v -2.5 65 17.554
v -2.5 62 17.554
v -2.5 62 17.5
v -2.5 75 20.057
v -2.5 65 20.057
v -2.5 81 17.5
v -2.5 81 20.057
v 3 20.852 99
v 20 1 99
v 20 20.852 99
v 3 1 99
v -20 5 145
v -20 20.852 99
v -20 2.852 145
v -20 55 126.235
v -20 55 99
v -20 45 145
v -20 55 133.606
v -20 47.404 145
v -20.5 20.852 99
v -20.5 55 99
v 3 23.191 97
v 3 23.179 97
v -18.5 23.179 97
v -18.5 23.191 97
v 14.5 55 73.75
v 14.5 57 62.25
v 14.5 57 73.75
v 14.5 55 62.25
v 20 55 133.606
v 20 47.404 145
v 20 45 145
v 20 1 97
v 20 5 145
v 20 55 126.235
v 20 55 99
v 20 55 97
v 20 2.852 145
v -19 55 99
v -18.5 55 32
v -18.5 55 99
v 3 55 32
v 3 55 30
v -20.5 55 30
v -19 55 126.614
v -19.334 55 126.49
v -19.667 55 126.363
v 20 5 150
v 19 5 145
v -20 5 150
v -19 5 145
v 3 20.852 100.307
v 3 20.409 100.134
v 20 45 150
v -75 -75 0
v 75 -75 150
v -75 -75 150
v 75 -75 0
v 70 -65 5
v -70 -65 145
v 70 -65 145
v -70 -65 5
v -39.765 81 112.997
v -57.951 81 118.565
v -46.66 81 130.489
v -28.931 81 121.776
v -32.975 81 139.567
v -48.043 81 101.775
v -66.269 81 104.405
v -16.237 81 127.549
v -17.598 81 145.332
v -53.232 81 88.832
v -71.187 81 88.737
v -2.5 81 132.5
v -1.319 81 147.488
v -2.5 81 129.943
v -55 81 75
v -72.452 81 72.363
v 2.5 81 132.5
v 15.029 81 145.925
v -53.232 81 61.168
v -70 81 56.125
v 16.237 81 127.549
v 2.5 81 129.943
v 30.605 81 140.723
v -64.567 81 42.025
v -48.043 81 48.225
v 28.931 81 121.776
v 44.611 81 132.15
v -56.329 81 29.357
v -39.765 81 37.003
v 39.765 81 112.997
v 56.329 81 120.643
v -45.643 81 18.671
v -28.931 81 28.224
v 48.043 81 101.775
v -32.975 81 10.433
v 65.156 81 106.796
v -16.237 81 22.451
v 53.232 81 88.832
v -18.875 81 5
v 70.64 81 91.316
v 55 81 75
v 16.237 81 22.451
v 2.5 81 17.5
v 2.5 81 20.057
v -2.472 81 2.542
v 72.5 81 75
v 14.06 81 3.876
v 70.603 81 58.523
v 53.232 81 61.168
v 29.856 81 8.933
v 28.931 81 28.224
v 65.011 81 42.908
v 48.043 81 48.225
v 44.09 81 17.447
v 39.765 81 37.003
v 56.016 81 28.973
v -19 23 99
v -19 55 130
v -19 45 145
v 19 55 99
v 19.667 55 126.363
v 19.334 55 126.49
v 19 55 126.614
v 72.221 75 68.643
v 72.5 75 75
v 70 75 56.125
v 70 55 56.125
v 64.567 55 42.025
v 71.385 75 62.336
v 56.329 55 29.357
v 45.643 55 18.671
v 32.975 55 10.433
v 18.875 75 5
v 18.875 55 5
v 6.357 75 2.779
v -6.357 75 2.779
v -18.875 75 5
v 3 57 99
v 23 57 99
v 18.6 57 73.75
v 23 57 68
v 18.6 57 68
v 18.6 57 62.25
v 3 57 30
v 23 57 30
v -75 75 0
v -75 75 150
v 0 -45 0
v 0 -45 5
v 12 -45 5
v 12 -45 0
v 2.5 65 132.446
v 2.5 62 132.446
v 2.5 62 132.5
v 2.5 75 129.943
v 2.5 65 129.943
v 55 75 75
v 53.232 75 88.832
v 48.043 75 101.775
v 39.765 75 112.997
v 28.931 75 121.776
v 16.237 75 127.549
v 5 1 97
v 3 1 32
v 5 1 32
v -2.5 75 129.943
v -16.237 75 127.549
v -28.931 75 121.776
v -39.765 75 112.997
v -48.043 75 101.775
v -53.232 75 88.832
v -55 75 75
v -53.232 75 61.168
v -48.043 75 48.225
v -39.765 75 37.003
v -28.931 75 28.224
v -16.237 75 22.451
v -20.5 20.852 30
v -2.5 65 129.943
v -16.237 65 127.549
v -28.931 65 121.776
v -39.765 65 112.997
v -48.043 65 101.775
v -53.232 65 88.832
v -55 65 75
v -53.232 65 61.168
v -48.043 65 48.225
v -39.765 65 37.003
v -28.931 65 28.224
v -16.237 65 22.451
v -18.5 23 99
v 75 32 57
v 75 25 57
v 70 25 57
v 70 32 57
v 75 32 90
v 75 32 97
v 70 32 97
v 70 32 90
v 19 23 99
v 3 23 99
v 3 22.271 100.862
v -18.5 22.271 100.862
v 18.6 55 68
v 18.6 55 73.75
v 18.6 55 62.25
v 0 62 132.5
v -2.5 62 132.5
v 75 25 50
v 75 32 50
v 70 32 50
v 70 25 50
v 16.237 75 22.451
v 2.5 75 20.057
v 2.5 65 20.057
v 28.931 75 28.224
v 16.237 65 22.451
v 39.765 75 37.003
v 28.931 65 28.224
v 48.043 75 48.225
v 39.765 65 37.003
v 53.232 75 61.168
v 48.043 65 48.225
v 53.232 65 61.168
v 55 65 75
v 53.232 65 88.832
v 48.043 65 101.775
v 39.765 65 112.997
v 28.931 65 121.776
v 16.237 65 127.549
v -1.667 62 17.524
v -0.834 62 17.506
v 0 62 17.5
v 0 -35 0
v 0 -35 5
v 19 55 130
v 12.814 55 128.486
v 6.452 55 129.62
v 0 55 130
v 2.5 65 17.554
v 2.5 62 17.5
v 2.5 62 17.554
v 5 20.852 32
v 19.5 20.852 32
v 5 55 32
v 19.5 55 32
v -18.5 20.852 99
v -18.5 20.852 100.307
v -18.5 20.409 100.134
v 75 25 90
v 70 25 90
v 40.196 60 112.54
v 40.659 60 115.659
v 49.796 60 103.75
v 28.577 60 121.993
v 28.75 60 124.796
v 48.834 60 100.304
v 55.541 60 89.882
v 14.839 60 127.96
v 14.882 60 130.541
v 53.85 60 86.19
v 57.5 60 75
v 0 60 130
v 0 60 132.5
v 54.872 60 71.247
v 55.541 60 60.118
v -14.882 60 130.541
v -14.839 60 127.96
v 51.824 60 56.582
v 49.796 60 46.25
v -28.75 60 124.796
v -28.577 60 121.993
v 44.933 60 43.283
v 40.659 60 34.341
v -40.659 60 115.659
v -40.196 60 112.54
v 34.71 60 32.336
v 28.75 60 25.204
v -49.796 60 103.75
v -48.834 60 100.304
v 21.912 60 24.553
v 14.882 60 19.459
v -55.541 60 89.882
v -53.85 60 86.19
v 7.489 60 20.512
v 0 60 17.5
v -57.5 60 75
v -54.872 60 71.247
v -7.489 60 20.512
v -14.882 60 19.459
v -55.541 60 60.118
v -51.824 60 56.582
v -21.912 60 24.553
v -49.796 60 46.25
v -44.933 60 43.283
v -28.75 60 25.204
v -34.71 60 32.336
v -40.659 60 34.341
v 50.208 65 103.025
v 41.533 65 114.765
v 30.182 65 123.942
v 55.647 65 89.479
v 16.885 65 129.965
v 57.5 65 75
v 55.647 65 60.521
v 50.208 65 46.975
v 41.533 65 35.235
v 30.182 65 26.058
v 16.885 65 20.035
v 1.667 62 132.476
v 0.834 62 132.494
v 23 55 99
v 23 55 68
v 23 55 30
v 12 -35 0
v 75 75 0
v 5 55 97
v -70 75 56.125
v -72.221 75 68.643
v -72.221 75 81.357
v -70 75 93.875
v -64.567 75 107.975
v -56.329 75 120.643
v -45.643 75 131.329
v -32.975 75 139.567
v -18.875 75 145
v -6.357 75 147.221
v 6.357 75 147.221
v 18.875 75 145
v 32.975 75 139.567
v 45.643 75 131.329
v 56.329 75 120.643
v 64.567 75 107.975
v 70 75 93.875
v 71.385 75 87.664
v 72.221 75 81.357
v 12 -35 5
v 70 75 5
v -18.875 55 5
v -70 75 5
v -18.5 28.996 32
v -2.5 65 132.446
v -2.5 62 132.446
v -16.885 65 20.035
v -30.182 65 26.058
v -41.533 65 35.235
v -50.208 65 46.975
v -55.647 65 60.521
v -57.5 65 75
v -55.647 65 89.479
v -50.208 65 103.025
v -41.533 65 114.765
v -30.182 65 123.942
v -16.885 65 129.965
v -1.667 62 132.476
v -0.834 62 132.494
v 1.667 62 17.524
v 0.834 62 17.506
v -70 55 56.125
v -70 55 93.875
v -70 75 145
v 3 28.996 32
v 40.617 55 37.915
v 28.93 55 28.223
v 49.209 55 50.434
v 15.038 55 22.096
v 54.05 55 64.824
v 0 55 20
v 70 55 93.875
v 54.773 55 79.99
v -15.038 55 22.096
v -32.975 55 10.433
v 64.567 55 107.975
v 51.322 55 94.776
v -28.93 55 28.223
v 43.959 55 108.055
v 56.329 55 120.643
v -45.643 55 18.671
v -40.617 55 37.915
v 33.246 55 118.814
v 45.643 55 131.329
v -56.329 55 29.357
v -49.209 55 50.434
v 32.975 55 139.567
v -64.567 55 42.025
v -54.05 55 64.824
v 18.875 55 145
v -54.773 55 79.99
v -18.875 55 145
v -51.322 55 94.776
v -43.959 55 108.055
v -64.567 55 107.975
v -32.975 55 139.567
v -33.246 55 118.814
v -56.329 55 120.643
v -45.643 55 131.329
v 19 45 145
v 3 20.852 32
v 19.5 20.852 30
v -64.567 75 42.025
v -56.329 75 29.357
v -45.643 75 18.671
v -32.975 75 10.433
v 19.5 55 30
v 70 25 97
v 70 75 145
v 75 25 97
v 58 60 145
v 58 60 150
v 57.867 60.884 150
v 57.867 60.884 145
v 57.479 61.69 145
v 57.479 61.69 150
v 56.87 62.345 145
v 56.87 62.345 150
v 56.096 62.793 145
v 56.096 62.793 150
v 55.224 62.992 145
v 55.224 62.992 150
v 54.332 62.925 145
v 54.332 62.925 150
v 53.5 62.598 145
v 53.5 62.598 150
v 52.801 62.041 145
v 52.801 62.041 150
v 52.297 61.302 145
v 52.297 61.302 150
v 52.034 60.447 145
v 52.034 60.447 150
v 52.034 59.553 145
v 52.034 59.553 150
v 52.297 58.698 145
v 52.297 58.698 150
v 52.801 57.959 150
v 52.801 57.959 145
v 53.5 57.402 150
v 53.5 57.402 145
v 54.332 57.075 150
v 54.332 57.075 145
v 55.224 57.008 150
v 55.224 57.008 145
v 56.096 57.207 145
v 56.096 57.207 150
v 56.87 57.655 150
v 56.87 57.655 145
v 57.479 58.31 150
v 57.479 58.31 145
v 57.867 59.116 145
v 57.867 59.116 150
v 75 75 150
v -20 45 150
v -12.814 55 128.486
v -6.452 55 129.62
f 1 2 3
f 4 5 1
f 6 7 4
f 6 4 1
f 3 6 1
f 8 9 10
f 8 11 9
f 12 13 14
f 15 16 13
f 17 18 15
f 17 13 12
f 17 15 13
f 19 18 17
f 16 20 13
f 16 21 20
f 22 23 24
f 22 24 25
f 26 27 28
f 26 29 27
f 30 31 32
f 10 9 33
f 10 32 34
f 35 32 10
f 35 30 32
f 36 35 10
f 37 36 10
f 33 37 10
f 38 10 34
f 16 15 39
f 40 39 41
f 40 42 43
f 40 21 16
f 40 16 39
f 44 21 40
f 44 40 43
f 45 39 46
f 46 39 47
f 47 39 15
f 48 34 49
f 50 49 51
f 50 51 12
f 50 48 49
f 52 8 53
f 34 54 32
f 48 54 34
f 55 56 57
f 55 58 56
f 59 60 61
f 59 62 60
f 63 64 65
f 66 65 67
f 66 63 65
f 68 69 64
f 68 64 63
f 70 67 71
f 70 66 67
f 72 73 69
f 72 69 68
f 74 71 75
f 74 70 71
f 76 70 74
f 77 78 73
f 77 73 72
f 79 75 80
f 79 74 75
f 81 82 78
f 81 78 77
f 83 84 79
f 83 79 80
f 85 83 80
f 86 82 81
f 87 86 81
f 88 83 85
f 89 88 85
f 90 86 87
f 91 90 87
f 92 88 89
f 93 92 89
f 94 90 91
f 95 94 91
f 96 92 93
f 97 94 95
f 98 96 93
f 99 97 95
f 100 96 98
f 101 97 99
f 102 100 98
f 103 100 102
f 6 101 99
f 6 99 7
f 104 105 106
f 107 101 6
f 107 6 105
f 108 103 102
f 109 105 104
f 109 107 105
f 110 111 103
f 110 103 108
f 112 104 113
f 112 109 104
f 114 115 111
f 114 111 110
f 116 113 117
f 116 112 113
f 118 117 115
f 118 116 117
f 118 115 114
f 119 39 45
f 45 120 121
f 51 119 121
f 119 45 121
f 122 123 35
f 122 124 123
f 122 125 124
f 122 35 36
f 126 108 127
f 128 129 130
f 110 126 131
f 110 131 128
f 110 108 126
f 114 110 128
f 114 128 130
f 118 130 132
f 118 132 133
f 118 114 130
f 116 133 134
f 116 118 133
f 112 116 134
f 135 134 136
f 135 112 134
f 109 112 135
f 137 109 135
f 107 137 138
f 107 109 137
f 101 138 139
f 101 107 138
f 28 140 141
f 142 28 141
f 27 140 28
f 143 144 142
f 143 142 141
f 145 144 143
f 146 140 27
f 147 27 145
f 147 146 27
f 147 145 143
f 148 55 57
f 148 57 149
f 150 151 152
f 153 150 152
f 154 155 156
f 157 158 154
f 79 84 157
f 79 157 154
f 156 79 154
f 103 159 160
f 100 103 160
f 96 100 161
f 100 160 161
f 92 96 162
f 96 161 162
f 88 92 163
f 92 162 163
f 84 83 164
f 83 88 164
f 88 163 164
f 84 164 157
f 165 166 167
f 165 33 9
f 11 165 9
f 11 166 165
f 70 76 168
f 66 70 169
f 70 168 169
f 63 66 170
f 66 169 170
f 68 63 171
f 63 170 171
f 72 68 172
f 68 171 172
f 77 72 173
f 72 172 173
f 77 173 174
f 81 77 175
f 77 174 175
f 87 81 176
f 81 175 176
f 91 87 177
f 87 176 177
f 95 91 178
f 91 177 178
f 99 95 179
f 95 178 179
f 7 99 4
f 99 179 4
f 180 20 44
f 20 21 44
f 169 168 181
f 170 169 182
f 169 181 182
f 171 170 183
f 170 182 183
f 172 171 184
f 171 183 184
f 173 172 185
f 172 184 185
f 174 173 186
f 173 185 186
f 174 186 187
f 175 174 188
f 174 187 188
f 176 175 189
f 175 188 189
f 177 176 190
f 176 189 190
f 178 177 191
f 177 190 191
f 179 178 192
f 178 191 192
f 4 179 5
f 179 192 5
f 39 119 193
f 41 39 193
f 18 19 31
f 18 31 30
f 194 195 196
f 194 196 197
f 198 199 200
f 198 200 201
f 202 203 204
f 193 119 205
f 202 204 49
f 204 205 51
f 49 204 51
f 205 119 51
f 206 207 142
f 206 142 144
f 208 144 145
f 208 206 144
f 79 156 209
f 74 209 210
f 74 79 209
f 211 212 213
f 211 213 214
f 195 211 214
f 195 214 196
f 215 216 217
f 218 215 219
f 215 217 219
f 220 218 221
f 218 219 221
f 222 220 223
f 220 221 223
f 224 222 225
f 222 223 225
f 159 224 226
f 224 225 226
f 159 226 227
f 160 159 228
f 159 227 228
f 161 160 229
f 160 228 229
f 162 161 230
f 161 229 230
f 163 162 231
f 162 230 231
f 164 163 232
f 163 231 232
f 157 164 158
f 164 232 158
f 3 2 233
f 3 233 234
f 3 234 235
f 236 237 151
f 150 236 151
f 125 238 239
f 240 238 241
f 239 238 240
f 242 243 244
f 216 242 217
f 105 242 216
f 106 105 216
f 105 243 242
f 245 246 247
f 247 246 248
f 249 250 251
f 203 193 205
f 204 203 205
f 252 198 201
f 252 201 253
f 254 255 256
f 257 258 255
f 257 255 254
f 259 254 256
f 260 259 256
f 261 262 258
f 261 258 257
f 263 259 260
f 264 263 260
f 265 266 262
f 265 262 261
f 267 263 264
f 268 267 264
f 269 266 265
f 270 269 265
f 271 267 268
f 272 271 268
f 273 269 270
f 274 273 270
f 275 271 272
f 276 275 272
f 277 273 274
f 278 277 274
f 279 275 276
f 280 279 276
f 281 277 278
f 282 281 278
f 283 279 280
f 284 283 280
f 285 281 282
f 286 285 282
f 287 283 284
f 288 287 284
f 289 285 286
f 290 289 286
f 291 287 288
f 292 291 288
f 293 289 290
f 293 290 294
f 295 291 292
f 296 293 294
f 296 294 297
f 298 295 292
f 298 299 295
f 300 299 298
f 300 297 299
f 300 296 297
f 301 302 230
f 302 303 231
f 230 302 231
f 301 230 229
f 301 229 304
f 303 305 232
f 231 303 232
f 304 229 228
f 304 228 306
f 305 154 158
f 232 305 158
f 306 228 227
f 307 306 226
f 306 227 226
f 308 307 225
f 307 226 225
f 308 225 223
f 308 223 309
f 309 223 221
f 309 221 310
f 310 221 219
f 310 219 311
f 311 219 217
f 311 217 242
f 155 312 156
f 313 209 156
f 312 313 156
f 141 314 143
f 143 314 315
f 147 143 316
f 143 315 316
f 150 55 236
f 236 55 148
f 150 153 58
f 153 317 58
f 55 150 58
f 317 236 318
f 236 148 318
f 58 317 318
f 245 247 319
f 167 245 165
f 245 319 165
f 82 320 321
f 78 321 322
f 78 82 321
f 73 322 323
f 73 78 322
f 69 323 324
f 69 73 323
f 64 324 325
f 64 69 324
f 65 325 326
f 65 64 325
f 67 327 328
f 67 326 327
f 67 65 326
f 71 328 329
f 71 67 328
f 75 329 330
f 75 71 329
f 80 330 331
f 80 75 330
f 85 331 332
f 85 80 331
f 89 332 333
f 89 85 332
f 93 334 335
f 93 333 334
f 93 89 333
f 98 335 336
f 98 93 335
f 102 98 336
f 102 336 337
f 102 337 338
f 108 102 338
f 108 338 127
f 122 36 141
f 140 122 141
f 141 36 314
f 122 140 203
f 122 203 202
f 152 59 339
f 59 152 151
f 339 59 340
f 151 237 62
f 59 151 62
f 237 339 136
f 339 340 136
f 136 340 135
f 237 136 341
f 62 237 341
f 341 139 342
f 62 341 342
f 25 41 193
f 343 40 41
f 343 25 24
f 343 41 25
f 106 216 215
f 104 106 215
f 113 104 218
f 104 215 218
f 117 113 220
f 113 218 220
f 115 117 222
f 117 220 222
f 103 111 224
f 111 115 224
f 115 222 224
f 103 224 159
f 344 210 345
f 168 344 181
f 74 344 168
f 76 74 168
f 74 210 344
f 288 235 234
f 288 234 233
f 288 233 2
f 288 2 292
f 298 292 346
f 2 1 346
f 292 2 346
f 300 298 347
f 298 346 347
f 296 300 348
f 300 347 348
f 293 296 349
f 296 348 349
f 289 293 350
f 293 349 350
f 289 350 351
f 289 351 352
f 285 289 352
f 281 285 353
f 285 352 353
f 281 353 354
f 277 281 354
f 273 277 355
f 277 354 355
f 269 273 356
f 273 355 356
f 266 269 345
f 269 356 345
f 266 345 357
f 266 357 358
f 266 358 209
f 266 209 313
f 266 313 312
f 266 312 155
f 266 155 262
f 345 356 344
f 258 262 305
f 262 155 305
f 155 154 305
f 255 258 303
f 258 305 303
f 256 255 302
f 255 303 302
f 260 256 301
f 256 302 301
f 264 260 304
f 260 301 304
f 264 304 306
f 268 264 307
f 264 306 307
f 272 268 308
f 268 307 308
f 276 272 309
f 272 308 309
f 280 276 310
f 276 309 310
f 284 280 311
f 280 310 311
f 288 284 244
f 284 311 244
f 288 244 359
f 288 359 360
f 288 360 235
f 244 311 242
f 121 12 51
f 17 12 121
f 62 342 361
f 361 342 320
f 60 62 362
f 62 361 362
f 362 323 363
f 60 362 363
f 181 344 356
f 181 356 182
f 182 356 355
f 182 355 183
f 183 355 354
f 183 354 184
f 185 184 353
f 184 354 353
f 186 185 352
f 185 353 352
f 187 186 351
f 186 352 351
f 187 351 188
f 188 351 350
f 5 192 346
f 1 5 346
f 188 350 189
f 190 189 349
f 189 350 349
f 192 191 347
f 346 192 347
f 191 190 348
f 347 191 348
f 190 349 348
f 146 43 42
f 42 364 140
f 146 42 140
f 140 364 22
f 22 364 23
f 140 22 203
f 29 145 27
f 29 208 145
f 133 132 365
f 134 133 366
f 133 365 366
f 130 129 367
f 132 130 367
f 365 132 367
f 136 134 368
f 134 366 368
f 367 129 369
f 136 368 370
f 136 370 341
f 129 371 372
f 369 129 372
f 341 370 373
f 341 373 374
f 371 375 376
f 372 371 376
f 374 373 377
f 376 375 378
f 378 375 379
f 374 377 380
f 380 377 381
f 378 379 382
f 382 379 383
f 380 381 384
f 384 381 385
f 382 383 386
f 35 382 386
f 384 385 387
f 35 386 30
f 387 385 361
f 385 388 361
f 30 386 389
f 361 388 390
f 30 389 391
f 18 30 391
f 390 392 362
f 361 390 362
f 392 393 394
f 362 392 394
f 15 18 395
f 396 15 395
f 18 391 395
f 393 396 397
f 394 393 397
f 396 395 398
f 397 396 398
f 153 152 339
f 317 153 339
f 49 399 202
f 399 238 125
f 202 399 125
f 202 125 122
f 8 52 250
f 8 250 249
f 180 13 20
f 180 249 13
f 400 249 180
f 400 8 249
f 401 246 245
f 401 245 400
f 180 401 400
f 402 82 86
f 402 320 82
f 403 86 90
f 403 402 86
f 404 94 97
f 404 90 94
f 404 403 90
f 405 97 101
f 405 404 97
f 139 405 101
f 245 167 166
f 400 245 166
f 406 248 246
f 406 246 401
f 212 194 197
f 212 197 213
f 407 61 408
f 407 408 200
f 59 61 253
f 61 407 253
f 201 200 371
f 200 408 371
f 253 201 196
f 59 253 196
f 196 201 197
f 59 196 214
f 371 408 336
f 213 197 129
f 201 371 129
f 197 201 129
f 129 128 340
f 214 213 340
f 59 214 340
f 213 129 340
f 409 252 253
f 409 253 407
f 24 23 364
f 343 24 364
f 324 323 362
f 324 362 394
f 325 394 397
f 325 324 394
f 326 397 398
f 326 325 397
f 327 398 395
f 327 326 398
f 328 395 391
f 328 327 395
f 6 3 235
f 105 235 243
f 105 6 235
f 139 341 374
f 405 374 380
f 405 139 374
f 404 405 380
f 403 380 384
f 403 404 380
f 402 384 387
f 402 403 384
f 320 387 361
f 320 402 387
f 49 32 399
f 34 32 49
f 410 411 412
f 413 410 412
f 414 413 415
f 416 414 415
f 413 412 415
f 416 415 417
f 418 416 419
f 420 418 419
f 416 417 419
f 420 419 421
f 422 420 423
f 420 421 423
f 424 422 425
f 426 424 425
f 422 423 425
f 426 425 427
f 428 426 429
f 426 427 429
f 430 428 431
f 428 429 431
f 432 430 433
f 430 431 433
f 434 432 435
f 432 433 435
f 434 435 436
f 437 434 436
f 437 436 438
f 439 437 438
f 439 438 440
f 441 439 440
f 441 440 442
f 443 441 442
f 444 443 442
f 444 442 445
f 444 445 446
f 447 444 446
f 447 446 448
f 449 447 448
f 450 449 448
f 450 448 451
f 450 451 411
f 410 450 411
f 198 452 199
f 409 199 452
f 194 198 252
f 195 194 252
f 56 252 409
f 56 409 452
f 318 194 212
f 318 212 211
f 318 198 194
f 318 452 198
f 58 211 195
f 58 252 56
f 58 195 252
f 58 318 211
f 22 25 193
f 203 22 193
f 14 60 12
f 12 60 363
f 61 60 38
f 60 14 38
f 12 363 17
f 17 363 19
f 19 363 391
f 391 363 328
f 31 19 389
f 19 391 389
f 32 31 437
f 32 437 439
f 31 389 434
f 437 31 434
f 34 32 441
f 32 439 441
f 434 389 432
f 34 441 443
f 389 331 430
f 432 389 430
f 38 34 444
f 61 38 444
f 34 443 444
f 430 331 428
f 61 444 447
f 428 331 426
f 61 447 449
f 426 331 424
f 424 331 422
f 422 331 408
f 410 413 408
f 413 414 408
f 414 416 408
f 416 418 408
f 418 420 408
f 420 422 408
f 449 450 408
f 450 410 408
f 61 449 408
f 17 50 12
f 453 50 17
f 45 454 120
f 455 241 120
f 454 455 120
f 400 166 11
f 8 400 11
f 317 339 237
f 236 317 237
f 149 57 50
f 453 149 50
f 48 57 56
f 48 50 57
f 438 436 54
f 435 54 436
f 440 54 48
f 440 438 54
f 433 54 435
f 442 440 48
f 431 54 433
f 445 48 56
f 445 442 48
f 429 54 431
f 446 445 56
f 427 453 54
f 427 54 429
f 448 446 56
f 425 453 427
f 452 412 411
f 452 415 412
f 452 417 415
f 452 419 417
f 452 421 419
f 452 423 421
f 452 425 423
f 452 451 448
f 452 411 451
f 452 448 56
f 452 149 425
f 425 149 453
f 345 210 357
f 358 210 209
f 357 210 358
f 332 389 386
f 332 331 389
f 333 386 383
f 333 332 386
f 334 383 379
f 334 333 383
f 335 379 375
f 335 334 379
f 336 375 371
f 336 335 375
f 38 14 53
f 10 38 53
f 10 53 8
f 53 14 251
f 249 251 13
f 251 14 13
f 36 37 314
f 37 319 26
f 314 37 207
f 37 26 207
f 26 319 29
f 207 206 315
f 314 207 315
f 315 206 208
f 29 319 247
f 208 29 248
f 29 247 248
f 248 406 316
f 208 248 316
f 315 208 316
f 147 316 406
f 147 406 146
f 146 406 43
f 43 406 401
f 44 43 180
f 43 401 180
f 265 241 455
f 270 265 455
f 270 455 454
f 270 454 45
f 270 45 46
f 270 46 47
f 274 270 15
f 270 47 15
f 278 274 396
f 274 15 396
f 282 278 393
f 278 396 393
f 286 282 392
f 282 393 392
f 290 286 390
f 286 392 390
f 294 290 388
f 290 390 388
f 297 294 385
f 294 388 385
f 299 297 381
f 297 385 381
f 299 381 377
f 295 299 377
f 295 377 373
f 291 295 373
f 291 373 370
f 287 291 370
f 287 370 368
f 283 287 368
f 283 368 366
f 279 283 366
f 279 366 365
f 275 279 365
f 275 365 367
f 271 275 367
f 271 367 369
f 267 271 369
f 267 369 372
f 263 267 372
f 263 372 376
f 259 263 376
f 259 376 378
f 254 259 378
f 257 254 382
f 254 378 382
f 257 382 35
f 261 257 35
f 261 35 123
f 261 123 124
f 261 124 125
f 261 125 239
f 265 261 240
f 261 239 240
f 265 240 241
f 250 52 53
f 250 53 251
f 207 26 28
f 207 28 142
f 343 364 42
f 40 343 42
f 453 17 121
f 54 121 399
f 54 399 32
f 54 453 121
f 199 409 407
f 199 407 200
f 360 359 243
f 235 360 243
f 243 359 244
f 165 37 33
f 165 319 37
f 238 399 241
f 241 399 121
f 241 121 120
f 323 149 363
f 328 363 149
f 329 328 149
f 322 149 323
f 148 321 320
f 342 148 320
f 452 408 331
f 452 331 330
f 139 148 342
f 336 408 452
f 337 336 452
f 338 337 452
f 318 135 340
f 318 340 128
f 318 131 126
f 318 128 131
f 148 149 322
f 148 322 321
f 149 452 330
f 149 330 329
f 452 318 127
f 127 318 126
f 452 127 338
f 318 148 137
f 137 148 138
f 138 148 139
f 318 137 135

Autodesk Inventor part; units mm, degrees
sketch "Náčrt1" plane through (0, 0, 0) normal (0, 0, 1) x (1, 0, 0)
  line L0 (0, 105) -> (0, -105) projected
  line L1 (-105, 0) -> (105, 0) projected
  line L2 (-75, 75) -> (75, 75)
  line L3 (75, 75) -> (75, -75)
  line L4 (75, -75) -> (-75, -75)
  line L5 (-75, -75) -> (-75, 75)
  point P0 (0, 0)
  dimension "d0" = 150
  dimension "d1" = 150
extrude "Vysunutí1" add sketch "Náčrt1" along normal blind 150
sketch "Náčrt2" plane through (-75, 75, 0) normal (0, 1, 0) x (1, 0, 0)
  line L0 (0, 0) -> (0, -150) projected
  line L1 (150, 0) -> (0, 0) projected
  line L2 (5, -145) -> (145, -145)
  line L3 (145, -145) -> (145, -5)
  line L4 (145, -5) -> (5, -5)
  line L5 (5, -5) -> (5, -145)
  point P0 (75, 0)
  dimension "d4" = 140
  dimension "d5" = 140
  dimension "d6" = 5
  dimension "d7" = 5
extrude "Vysunutí2" cut sketch "Náčrt2" against normal blind 140
sketch "Náčrt3" plane through (0, 0, 150) normal (0, 0, 1) x (1, 0, 0)
  line L0 (-20, 45) -> (20, 45)
  line L1 (20, 45) -> (20, 5)
  line L2 (20, 5) -> (-20, 5)
  line L3 (-20, 5) -> (-20, 45)
  line L4 (0, 105) -> (0, -105) projected
  line L5 (-105, 0) -> (105, 0) projected
  line L6 (-75, -75) -> (75, -75) projected
  circle A0 centre (55, 60) radius 3
  line L7 (75, -75) -> (75, 75) projected
  line L8 (75, 75) -> (-75, 75) projected
  point P0 (0, 0)
  dimension "d10" = 40
  dimension "d11" = 40
  dimension "d12" = 80
  dimension "d13" = 6
  dimension "d14" = 20
  dimension "d15" = 15
extrude "Vysunutí3" cut sketch "Náčrt3" against normal blind 10 contours L0 L4 L2 L3 | L0 L1 L2 L4 | A0
sketch "Náčrt4" plane through (-70, 75, 5) normal (0, 0, 1) x (1, 0, 0)
  line L0 (70, -120) -> (82, -120)
  line L1 (82, -120) -> (82, -110)
  line L2 (82, -110) -> (70, -110)
  line L3 (70, -110) -> (70, -120)
  line L4 (-5, -150) -> (145, -150) projected
  line L5 (145, -150) -> (145, 0) projected
  point P0 (70, -75)
  point P1 (70, -115)
  dimension "d18" = 12
  dimension "d19" = 10
  dimension "d20" = 30
  dimension "d21" = 75
extrude "Vysunutí4" cut sketch "Náčrt4" against normal blind 10
sketch "Náčrt5" plane through (75, -75, 0) normal (1, 0, 0) x (0, 0, -1)
  line L0 (0, 0) -> (0, 150) projected
  line L1 (0, 0) -> (-150, 0) projected
  line L2 (-97, 107) -> (-90, 107)
  line L3 (-90, 107) -> (-90, 100)
  line L4 (-90, 100) -> (-97, 100)
  line L5 (-97, 100) -> (-97, 107)
  line L6 (-57, 107) -> (-50, 107)
  line L7 (-50, 107) -> (-50, 100)
  line L8 (-50, 100) -> (-57, 100)
  line L9 (-57, 100) -> (-57, 107)
  point P0 (0, 75)
  point P1 (-75, 0)
  dimension "d24" = 7
  dimension "d25" = 7
  dimension "d26" = 90
  dimension "d27" = 100
  dimension "d184" = 7
  dimension "d185" = 7
  dimension "d186" = 100
  dimension "d187" = 50
extrude "Vysunutí5" cut sketch "Náčrt5" against normal blind 10
ref_plane "Pracovní rovina3" through (0, 75, 0) normal (0, 1, 0) x (-1, 0, 0)
sketch "Náčrt8" plane through (0, 75, 0) normal (0, 1, 0) x (-1, 0, 0)
  line L0 (70, 145) -> (70, 5) projected
  line L1 (-70, 145) -> (70, 145) projected
  line L2 (70, 5) -> (-70, 5) projected
  line L3 (0, 5) -> (0, 0) projected
  circle A0 centre (0, 75) radius 72.5
  point P0 (70, 75)
  point P1 (70, 75)
  dimension "d132" = 70
  dimension "d133" = 70
  dimension "d134" = 145
extrude "Vysunutí6" add sketch "Náčrt8" against normal blind 20 contours A0 L0 | L0 A0 L2 L1 | L1 A0 | A0 L3 L2 | L2 L3 A0
sketch "Náčrt10" plane through (0, 75, 0) normal (0, 1, 0) x (1, 0, 0)
  line L0 (-75, 0) -> (-75, -150) projected
  line L1 (75, 0) -> (-75, 0) projected
  point P0 (0, 0)
  point P1 (0, -75)
  point P2 (-75, -75)
  point P3 (0, 0)
  dimension "d38" = 75
  dimension "d39" = 75
hole "Díra1" at (0, 75, 75) direction (0, -1, 0) diameter 110 depth 50
sketch "Náčrt11" plane through (0, 0, 0) normal (1, 0, 0) x (0, 1, 0)
  line L0 (5, 150) -> (5, 145) projected
  line L1 (75, 145) -> (-65, 145) projected
  line L2 (45, 150) -> (45, 145) projected
  line L3 (55, 140) -> (55, 75) projected
  line L4 (55, 130) -> (75, 130) projected
  line L5 (45, 145) -> (55, 130)
  line L6 (55, 99) -> (23, 99)
  line L7 (23, 99) -> (5, 145)
  line L8 (23, 99) -> (23, 42)
  line L9 (55, 99) -> (55, 130)
  line L10 (2.8523, 145) -> (20.8523, 99)
  line L11 (20.8523, 99) -> (23, 99)
  line L12 (47.4037, 145) -> (55, 133.6056)
  line L13 (2.8523, 145) -> (5, 145)
  line L14 (45, 145) -> (47.4037, 145)
  line L15 (55, 130) -> (55, 133.6056)
  point P0 (0, 0)
  dimension "d51" = 32
  dimension "d52" = 46
  dimension "d53" = 57
  dimension "d54" = 2
  dimension "d55" = 2
extrude "Vysunutí8" add sketch "Náčrt11" along normal mid plane 40 contours L12 L3 L5 L1 | L7 L11 L10 L1
sketch "Náčrt14" plane through (-20, 0, 0) normal (-1, 0, 0) x (0, 0, 1)
  line L0 (99, 20.8523) -> (99, 23) projected
  line L1 (99, 23) -> (99, 55)
  line L2 (130, 55) -> (20, 55) projected
  line L3 (145, 45) -> (130, 55) projected
  line L4 (130, 55) -> (145, 45)
  line L5 (145, 5) -> (145, 45) projected
  line L6 (145, 45) -> (145, 5)
  line L7 (99, 23) -> (145, 5) projected
  line L8 (145, 5) -> (99, 23)
  point P0 (0, 0)
extrude "Vysunutí9" add sketch "Náčrt14" against normal blind 1
sketch "Náčrt15" plane through (20, 0, 0) normal (1, 0, 0) x (0, 0, -1)
  line L0 (-145, 75) -> (-145, -65) projected
  line L1 (-99, 23) -> (-145, 5) projected
  line L2 (-145, 5) -> (-99, 23)
  line L3 (-99, 23) -> (-99, 55) projected
  line L4 (-99, 23) -> (-99, 55)
  line L5 (-99, 55) -> (-130, 55)
  line L6 (-145, 45) -> (-130, 55) projected
  line L7 (-130, 55) -> (-145, 45)
  line L8 (-145, 45) -> (-145, 5)
  point P0 (0, 0)
extrude "Vysunutí10" add sketch "Náčrt15" against normal blind 1
ref_plane "Pracovní rovina8" through (19.5, 0, 0) normal (1, 0, 0) x (0, 0, -1)
sketch "Náčrt16" plane through (19.5, 0, 0) normal (1, 0, 0) x (0, 0, -1)
  line L0 (-99, 55) -> (-99, 23) projected
  line L1 (-99, 20.8523) -> (-145, 2.8523) projected
  line L2 (-126.614, 55) -> (-99, 55) projected
  line L3 (-99, 20.8523) -> (-32, 20.8523)
  line L4 (-32, 20.8523) -> (-32, 55)
  line L5 (-32, 20.8523) -> (-30, 20.8523)
  line L6 (-30, 20.8523) -> (-30, 55)
  line L7 (-30, 55) -> (-32, 55)
  point P0 (0, 0)
  point P1 (-130, 55)
  dimension "d69" = 67
  dimension "d70" = 2
extrude "Vysunutí11" add sketch "Náčrt16" against normal blind 40
sketch "Náčrt17" plane through (19.5, 20.8523, 32) normal (0, 0, 1) x (1, 0, 0)
  line L0 (-40, 34.1477) -> (-40, 0) projected
  line L1 (0, 0) -> (-40, 0) projected
  line L2 (0, 34.1477) -> (-40, 34.1477) projected
  line L3 (-40, 0) -> (-40, 34.1477)
  line L4 (-40, 34.1477) -> (-38, 34.1477)
  line L5 (-38, 34.1477) -> (-38, 0)
  point P0 (-19.5, -20.8523)
  dimension "d73" = 2
extrude "Vysunutí12" add sketch "Náčrt17" along normal blind 67
ref_plane "Pracovní rovina10" through (19, 23, 99) normal (0, 0, -1) x (-1, 0, 0)
sketch "Náčrt20" plane through (19, 23, 99) normal (0, 0, -1) x (-1, 0, 0)
  line L0 (0, -18) -> (0, 22) projected
  line L1 (0, -18) -> (0, 0) projected
  line L2 (0, 0) -> (37.5, 0) projected
  line L3 (37.5, 0) -> (38, 0) projected
  line L4 (38, 0) -> (38, -18) projected
  line L5 (38, -18) -> (0, -18) projected
  line L6 (38, 0) -> (1.4186, 0)
  line L7 (38, 32) -> (19, 32) projected
  line L8 (19, 32) -> (0, 32) projected
  line L9 (1.4186, 0) -> (1.4186, 32)
  line L10 (1.4186, 0) -> (1.4186, -18)
  line L11 (1.4186, -18) -> (-0.5814, -18)
  line L12 (-0.5814, -18) -> (-0.5814, 32)
  line L13 (-0.5814, 32) -> (1.4186, 32)
  line L14 (38, 0) -> (16, 0)
  line L15 (16, 0) -> (16, 32)
  line L16 (16, 32) -> (14, 32)
  line L17 (14, 32) -> (14, -18)
  line L18 (14, -18) -> (16, -18)
  line L19 (-1, -18) -> (39, -18) projected
  line L20 (16, 0) -> (16, -18)
  line L21 (-0.5814, 32) -> (-4.5814, 32)
  line L22 (-4.5814, 32) -> (-4.5814, -18)
  line L23 (-4.5814, -18) -> (-6.5814, -18)
  line L24 (-6.5814, -18) -> (-6.5814, 32)
  line L25 (-6.5814, 32) -> (-4.5814, 32)
  line L26 (-6.5814, -18) -> (-6.5814, -20.025)
  line L27 (-6.5814, -20.025) -> (-4.5814, -20.025)
  line L28 (-4.5814, -20.025) -> (-4.5814, -18)
  line L29 (-0.5814, -18) -> (-0.5814, -22)
  line L30 (-0.5814, -22) -> (1.4186, -22)
  line L31 (1.4186, -22) -> (1.4186, -18)
  line L32 (-6.5814, -20.025) -> (-6.5814, -22)
  line L33 (-6.5814, -22) -> (-4.5814, -22)
  line L34 (-4.5814, -22) -> (-4.5814, -20.025)
  line L35 (14, -18) -> (14, -22)
  line L36 (14, -22) -> (16, -22)
  line L37 (16, -22) -> (16, -18)
  point P0 (19, -23)
  point P1 (0, 32)
  point P2 (-5.5814, -18)
  point P3 (-5.5814, 32)
  dimension "d83" = 2
  dimension "d84" = 22
  dimension "d85" = 2
  dimension "d86" = 4
  dimension "d87" = 2
  dimension "d94" = 50
  dimension "d95" = 50
  dimension "d96" = 4
extrude "Vysunutí14" add sketch "Náčrt20" along normal blind 67 contours L17 L2 L20 L5 | L5 L37 L36 L35 | L17 L8 L15 L2
ref_plane "Pracovní rovina11" through (-75, 60, 0) normal (0, 1, 0) x (1, 0, 0)
sketch "Náčrt26" plane through (-75, 60, 0) normal (0, 1, 0) x (1, 0, 0)
  circle A0 centre (75, -75) radius 55 projected
  line L0 (75, -5) -> (75, 0) projected
  arc A1 (56.1254, -5) -> (5, -56.1254) centre (75, -75) ccw projected
  circle A2 centre (75, -75) radius 57.5
  dimension "d136" = 115
hole "Díra3" at (0, 60, 75) direction (0, 1, 0) diameter 115 depth 5
sketch "Náčrt28" plane through (5, 23, 99) normal (1, 0, 0) x (0, 0, -1)
  line L0 (0, 32) -> (67, 32) projected
  line L1 (0, 32) -> (2, 32)
  line L2 (2, 32) -> (2, -22)
  line L3 (2, -22) -> (0, -22)
  line L4 (0, -22) -> (0, 32)
  point P0 (99, -23)
  point P1 (2, 32)
  point P2 (50, 32)
  dimension "d157" = 2
  dimension "d158" = 54
extrude "Vysunutí20" add sketch "Náčrt28" along normal blind 15
sketch "Náčrt27" plane through (0, 65, 75) normal (0, -1, 0) x (1, 0, 0)
  circle A0 centre (0, 0) radius 55 projected
  line L0 (-2.5, -57.5) -> (2.5, -57.5)
  line L1 (2.5, -57.5) -> (2.5, -50)
  line L2 (2.5, -50) -> (-2.5, -50)
  line L3 (-2.5, -50) -> (-2.5, -57.5)
  line L4 (0, 105) -> (0, -105) projected
  line L5 (75, -75) -> (-75, -75) projected
  line L6 (2.5, 50) -> (2.5, 57.5)
  line L7 (2.5, 57.5) -> (-2.5, 57.5)
  line L8 (-2.5, 57.5) -> (-2.5, 50)
  line L9 (-2.5, 50) -> (2.5, 50)
  circle A1 centre (0, 0) radius 57.5 projected
  point P0 (0, -75)
  point P1 (52.6504, -23.1124)
  point P2 (-52.6504, -23.1124)
  dimension "d146" = 5
  dimension "d148" = 25
  dimension "d155" = 360
extrude "Vysunutí19" cut sketch "Náčrt27" along normal blind 3 and the other way blind 10 contours L6 L9 L4 A0 | A0 L4 A1 L6 | L1 A1 L4 A0 | A0 L4 L2 L1 | L4 L9 L8 A0 | A0 L8 A1 L4 | A1 L7 L6 | L4 A1 L3 A0 | A0 L3 L2 L4 | L1 L0 A1 | A1 L8 L7 | L0 L3 A1
sketch "Náčrt30" plane through (-75, 75, 0) normal (0, 1, 0) x (1, 0, 0)
  arc A0 (56.1254, -5) -> (5, -56.1254) centre (75, -75) ccw projected
  arc A1 (72.5, -20.0568) -> (72.5, -129.9432) centre (75, -75) ccw projected
  circle A2 centre (75, -75) radius 72.5
  circle A3 centre (75, -75) radius 55
  point P0 (75, 0)
  point P1 (72.5, -129.9432)
  point P2 (5, -56.1254)
  point P3 (56.1254, -5)
extrude "Vysunutí22" add sketch "Náčrt30" along normal blind 6
sketch "Náčrt31" plane through (0, 81, 75) normal (0, 1, 0) x (1, 0, 0)
  circle A0 centre (0, 0) radius 55 projected
  line L0 (-2.5, 54.9432) -> (-2.5, 57.5) projected
  line L1 (-2.5, 57.5) -> (2.5, 57.5) projected
  line L2 (2.5, 57.5) -> (2.5, 54.9432) projected
  line L3 (-2.5, -57.5) -> (-2.5, -54.9432) projected
  line L4 (2.5, -57.5) -> (-2.5, -57.5) projected
  line L5 (2.5, -54.9432) -> (2.5, -57.5) projected
  line L6 (-2.5, -57.5) -> (2.5, -57.5)
  line L7 (2.5, -57.5) -> (2.5, -53.9565)
  line L8 (2.5, -53.9565) -> (-2.5, -53.9565)
  line L9 (-2.5, -53.9565) -> (-2.5, -57.5)
  line L10 (2.5, 57.5) -> (-2.5, 57.5)
  line L11 (-2.5, 57.5) -> (-2.5, 54.0591)
  line L12 (-2.5, 54.0591) -> (2.5, 54.0591)
  line L13 (2.5, 54.0591) -> (2.5, 57.5)
  point P0 (0, 75)
  dimension "d166" = 3.5435
  dimension "d167" = 3.4409
extrude "Vysunutí23" cut sketch "Náčrt31" against normal blind 6 contours A0 L0 L1 L2 | L5 L4 L3 A0
sketch "Náčrt32" plane through (-19, 5, 145) normal (0, 0.9312, 0.3644) x (1, 0, 0)
  line L0 (22, 49.3964) -> (0.5, 49.3964) projected
  line L1 (0.5, 49.3964) -> (22, 49.3964)
  line L2 (22, 49.3964) -> (22, 47.3964)
  line L3 (22, 47.3964) -> (0.5, 47.3964)
  line L4 (0.5, 47.3964) -> (0.5, 49.3964)
  point P0 (19, 133.2082)
  point P1 (22, 49.3964)
  dimension "d171" = 2
extrude "Vysunutí24" cut sketch "Náčrt32" against normal blind 8
sketch "Náčrt33" plane through (3, 55, 99) normal (0, 1, 0) x (1, 0, 0)
  line L0 (0, 0) -> (17, 0) projected
  line L1 (0, 0) -> (16.5, 0)
  line L2 (16.5, 69) -> (0, 69)
  line L3 (0, 69) -> (0, 0)
  line L4 (16.5, 67) -> (2, 67) projected
  line L5 (16.5, 69) -> (-23.5, 69) projected
  line L6 (16.5, 69) -> (16.5, 67) projected
  line L7 (11.5, 25.25) -> (15.6, 25.25)
  line L8 (15.6, 25.25) -> (15.6, 36.75)
  line L9 (15.6, 36.75) -> (11.5, 36.75)
  line L10 (11.5, 36.75) -> (11.5, 25.25)
  line L11 (20, 0) -> (20, 69)
  line L12 (20, 69) -> (16.5, 69)
  line L13 (20, 0) -> (16.5, 0)
  line L14 (0, 0) -> (0, 67) projected
  line L15 (2, 35) -> (2, 35) projected
  line L16 (2, 31) -> (22.5208, 31)
  line L17 (2, 35) -> (2, 35)
  line L18 (0, 35) -> (0, 27)
  point P0 (-3, 99)
  point P1 (0, 51)
  dimension "d174" = 11.5
  dimension "d175" = 4.1
  dimension "d176" = 20
  dimension "d177" = 11.5
extrude "Vysunutí25" add sketch "Náčrt33" along normal blind 2
sketch "Náčrt34" plane through (3, 1, 99) normal (-1, 0, 0) x (0, 0, 1)
  line L0 (0, 19.8523) -> (0, 0) projected
  line L1 (-67, 54) -> (-67, 19.8523) projected
  line L2 (0, 19.8523) -> (-67, 19.8523)
  line L3 (-67, 19.8523) -> (-67, 22)
  line L4 (-67, 22) -> (-67, 19.8523)
  line L5 (-2, 0) -> (-2, 54) projected
  line L6 (0, 54) -> (0, 22) projected
  line L7 (0, 22) -> (0, 19.8523)
  line L8 (46, 4) -> (0, 22) projected
  line L9 (0, 22) -> (-67, 27.9965)
  line L10 (-67, 19.8523) -> (-67, 0) projected
  line L11 (-67, 19.8523) -> (-67, 27.9965)
  point P0 (-99, -1)
extrude "Vysunutí26" add sketch "Náčrt34" along normal blind 22
sketch "Náčrt35" plane through (3, 20.8523, 99) normal (-1, 0, 0) x (0, 0, 1)
  line L0 (0, 0) -> (0, -19.8523) projected
  line L1 (0, 0) -> (-2, 0)
  line L2 (-2, -19.8523) -> (-2, 34.1477) projected
  line L3 (-2, 0) -> (-2, 2.3389)
  line L4 (-2, 2.3389) -> (0, 2.1477)
  line L5 (0, 2.1477) -> (5.4885, 0)
  line L6 (46, -15.8523) -> (0, 2.1477) projected
  line L7 (0, 0) -> (5.4885, 0)
  point P0 (-99, -20.8523)
extrude "Vysunutí27" add sketch "Náčrt35" along normal blind 22
properties part number "Box na elektrotechniku oprava"
